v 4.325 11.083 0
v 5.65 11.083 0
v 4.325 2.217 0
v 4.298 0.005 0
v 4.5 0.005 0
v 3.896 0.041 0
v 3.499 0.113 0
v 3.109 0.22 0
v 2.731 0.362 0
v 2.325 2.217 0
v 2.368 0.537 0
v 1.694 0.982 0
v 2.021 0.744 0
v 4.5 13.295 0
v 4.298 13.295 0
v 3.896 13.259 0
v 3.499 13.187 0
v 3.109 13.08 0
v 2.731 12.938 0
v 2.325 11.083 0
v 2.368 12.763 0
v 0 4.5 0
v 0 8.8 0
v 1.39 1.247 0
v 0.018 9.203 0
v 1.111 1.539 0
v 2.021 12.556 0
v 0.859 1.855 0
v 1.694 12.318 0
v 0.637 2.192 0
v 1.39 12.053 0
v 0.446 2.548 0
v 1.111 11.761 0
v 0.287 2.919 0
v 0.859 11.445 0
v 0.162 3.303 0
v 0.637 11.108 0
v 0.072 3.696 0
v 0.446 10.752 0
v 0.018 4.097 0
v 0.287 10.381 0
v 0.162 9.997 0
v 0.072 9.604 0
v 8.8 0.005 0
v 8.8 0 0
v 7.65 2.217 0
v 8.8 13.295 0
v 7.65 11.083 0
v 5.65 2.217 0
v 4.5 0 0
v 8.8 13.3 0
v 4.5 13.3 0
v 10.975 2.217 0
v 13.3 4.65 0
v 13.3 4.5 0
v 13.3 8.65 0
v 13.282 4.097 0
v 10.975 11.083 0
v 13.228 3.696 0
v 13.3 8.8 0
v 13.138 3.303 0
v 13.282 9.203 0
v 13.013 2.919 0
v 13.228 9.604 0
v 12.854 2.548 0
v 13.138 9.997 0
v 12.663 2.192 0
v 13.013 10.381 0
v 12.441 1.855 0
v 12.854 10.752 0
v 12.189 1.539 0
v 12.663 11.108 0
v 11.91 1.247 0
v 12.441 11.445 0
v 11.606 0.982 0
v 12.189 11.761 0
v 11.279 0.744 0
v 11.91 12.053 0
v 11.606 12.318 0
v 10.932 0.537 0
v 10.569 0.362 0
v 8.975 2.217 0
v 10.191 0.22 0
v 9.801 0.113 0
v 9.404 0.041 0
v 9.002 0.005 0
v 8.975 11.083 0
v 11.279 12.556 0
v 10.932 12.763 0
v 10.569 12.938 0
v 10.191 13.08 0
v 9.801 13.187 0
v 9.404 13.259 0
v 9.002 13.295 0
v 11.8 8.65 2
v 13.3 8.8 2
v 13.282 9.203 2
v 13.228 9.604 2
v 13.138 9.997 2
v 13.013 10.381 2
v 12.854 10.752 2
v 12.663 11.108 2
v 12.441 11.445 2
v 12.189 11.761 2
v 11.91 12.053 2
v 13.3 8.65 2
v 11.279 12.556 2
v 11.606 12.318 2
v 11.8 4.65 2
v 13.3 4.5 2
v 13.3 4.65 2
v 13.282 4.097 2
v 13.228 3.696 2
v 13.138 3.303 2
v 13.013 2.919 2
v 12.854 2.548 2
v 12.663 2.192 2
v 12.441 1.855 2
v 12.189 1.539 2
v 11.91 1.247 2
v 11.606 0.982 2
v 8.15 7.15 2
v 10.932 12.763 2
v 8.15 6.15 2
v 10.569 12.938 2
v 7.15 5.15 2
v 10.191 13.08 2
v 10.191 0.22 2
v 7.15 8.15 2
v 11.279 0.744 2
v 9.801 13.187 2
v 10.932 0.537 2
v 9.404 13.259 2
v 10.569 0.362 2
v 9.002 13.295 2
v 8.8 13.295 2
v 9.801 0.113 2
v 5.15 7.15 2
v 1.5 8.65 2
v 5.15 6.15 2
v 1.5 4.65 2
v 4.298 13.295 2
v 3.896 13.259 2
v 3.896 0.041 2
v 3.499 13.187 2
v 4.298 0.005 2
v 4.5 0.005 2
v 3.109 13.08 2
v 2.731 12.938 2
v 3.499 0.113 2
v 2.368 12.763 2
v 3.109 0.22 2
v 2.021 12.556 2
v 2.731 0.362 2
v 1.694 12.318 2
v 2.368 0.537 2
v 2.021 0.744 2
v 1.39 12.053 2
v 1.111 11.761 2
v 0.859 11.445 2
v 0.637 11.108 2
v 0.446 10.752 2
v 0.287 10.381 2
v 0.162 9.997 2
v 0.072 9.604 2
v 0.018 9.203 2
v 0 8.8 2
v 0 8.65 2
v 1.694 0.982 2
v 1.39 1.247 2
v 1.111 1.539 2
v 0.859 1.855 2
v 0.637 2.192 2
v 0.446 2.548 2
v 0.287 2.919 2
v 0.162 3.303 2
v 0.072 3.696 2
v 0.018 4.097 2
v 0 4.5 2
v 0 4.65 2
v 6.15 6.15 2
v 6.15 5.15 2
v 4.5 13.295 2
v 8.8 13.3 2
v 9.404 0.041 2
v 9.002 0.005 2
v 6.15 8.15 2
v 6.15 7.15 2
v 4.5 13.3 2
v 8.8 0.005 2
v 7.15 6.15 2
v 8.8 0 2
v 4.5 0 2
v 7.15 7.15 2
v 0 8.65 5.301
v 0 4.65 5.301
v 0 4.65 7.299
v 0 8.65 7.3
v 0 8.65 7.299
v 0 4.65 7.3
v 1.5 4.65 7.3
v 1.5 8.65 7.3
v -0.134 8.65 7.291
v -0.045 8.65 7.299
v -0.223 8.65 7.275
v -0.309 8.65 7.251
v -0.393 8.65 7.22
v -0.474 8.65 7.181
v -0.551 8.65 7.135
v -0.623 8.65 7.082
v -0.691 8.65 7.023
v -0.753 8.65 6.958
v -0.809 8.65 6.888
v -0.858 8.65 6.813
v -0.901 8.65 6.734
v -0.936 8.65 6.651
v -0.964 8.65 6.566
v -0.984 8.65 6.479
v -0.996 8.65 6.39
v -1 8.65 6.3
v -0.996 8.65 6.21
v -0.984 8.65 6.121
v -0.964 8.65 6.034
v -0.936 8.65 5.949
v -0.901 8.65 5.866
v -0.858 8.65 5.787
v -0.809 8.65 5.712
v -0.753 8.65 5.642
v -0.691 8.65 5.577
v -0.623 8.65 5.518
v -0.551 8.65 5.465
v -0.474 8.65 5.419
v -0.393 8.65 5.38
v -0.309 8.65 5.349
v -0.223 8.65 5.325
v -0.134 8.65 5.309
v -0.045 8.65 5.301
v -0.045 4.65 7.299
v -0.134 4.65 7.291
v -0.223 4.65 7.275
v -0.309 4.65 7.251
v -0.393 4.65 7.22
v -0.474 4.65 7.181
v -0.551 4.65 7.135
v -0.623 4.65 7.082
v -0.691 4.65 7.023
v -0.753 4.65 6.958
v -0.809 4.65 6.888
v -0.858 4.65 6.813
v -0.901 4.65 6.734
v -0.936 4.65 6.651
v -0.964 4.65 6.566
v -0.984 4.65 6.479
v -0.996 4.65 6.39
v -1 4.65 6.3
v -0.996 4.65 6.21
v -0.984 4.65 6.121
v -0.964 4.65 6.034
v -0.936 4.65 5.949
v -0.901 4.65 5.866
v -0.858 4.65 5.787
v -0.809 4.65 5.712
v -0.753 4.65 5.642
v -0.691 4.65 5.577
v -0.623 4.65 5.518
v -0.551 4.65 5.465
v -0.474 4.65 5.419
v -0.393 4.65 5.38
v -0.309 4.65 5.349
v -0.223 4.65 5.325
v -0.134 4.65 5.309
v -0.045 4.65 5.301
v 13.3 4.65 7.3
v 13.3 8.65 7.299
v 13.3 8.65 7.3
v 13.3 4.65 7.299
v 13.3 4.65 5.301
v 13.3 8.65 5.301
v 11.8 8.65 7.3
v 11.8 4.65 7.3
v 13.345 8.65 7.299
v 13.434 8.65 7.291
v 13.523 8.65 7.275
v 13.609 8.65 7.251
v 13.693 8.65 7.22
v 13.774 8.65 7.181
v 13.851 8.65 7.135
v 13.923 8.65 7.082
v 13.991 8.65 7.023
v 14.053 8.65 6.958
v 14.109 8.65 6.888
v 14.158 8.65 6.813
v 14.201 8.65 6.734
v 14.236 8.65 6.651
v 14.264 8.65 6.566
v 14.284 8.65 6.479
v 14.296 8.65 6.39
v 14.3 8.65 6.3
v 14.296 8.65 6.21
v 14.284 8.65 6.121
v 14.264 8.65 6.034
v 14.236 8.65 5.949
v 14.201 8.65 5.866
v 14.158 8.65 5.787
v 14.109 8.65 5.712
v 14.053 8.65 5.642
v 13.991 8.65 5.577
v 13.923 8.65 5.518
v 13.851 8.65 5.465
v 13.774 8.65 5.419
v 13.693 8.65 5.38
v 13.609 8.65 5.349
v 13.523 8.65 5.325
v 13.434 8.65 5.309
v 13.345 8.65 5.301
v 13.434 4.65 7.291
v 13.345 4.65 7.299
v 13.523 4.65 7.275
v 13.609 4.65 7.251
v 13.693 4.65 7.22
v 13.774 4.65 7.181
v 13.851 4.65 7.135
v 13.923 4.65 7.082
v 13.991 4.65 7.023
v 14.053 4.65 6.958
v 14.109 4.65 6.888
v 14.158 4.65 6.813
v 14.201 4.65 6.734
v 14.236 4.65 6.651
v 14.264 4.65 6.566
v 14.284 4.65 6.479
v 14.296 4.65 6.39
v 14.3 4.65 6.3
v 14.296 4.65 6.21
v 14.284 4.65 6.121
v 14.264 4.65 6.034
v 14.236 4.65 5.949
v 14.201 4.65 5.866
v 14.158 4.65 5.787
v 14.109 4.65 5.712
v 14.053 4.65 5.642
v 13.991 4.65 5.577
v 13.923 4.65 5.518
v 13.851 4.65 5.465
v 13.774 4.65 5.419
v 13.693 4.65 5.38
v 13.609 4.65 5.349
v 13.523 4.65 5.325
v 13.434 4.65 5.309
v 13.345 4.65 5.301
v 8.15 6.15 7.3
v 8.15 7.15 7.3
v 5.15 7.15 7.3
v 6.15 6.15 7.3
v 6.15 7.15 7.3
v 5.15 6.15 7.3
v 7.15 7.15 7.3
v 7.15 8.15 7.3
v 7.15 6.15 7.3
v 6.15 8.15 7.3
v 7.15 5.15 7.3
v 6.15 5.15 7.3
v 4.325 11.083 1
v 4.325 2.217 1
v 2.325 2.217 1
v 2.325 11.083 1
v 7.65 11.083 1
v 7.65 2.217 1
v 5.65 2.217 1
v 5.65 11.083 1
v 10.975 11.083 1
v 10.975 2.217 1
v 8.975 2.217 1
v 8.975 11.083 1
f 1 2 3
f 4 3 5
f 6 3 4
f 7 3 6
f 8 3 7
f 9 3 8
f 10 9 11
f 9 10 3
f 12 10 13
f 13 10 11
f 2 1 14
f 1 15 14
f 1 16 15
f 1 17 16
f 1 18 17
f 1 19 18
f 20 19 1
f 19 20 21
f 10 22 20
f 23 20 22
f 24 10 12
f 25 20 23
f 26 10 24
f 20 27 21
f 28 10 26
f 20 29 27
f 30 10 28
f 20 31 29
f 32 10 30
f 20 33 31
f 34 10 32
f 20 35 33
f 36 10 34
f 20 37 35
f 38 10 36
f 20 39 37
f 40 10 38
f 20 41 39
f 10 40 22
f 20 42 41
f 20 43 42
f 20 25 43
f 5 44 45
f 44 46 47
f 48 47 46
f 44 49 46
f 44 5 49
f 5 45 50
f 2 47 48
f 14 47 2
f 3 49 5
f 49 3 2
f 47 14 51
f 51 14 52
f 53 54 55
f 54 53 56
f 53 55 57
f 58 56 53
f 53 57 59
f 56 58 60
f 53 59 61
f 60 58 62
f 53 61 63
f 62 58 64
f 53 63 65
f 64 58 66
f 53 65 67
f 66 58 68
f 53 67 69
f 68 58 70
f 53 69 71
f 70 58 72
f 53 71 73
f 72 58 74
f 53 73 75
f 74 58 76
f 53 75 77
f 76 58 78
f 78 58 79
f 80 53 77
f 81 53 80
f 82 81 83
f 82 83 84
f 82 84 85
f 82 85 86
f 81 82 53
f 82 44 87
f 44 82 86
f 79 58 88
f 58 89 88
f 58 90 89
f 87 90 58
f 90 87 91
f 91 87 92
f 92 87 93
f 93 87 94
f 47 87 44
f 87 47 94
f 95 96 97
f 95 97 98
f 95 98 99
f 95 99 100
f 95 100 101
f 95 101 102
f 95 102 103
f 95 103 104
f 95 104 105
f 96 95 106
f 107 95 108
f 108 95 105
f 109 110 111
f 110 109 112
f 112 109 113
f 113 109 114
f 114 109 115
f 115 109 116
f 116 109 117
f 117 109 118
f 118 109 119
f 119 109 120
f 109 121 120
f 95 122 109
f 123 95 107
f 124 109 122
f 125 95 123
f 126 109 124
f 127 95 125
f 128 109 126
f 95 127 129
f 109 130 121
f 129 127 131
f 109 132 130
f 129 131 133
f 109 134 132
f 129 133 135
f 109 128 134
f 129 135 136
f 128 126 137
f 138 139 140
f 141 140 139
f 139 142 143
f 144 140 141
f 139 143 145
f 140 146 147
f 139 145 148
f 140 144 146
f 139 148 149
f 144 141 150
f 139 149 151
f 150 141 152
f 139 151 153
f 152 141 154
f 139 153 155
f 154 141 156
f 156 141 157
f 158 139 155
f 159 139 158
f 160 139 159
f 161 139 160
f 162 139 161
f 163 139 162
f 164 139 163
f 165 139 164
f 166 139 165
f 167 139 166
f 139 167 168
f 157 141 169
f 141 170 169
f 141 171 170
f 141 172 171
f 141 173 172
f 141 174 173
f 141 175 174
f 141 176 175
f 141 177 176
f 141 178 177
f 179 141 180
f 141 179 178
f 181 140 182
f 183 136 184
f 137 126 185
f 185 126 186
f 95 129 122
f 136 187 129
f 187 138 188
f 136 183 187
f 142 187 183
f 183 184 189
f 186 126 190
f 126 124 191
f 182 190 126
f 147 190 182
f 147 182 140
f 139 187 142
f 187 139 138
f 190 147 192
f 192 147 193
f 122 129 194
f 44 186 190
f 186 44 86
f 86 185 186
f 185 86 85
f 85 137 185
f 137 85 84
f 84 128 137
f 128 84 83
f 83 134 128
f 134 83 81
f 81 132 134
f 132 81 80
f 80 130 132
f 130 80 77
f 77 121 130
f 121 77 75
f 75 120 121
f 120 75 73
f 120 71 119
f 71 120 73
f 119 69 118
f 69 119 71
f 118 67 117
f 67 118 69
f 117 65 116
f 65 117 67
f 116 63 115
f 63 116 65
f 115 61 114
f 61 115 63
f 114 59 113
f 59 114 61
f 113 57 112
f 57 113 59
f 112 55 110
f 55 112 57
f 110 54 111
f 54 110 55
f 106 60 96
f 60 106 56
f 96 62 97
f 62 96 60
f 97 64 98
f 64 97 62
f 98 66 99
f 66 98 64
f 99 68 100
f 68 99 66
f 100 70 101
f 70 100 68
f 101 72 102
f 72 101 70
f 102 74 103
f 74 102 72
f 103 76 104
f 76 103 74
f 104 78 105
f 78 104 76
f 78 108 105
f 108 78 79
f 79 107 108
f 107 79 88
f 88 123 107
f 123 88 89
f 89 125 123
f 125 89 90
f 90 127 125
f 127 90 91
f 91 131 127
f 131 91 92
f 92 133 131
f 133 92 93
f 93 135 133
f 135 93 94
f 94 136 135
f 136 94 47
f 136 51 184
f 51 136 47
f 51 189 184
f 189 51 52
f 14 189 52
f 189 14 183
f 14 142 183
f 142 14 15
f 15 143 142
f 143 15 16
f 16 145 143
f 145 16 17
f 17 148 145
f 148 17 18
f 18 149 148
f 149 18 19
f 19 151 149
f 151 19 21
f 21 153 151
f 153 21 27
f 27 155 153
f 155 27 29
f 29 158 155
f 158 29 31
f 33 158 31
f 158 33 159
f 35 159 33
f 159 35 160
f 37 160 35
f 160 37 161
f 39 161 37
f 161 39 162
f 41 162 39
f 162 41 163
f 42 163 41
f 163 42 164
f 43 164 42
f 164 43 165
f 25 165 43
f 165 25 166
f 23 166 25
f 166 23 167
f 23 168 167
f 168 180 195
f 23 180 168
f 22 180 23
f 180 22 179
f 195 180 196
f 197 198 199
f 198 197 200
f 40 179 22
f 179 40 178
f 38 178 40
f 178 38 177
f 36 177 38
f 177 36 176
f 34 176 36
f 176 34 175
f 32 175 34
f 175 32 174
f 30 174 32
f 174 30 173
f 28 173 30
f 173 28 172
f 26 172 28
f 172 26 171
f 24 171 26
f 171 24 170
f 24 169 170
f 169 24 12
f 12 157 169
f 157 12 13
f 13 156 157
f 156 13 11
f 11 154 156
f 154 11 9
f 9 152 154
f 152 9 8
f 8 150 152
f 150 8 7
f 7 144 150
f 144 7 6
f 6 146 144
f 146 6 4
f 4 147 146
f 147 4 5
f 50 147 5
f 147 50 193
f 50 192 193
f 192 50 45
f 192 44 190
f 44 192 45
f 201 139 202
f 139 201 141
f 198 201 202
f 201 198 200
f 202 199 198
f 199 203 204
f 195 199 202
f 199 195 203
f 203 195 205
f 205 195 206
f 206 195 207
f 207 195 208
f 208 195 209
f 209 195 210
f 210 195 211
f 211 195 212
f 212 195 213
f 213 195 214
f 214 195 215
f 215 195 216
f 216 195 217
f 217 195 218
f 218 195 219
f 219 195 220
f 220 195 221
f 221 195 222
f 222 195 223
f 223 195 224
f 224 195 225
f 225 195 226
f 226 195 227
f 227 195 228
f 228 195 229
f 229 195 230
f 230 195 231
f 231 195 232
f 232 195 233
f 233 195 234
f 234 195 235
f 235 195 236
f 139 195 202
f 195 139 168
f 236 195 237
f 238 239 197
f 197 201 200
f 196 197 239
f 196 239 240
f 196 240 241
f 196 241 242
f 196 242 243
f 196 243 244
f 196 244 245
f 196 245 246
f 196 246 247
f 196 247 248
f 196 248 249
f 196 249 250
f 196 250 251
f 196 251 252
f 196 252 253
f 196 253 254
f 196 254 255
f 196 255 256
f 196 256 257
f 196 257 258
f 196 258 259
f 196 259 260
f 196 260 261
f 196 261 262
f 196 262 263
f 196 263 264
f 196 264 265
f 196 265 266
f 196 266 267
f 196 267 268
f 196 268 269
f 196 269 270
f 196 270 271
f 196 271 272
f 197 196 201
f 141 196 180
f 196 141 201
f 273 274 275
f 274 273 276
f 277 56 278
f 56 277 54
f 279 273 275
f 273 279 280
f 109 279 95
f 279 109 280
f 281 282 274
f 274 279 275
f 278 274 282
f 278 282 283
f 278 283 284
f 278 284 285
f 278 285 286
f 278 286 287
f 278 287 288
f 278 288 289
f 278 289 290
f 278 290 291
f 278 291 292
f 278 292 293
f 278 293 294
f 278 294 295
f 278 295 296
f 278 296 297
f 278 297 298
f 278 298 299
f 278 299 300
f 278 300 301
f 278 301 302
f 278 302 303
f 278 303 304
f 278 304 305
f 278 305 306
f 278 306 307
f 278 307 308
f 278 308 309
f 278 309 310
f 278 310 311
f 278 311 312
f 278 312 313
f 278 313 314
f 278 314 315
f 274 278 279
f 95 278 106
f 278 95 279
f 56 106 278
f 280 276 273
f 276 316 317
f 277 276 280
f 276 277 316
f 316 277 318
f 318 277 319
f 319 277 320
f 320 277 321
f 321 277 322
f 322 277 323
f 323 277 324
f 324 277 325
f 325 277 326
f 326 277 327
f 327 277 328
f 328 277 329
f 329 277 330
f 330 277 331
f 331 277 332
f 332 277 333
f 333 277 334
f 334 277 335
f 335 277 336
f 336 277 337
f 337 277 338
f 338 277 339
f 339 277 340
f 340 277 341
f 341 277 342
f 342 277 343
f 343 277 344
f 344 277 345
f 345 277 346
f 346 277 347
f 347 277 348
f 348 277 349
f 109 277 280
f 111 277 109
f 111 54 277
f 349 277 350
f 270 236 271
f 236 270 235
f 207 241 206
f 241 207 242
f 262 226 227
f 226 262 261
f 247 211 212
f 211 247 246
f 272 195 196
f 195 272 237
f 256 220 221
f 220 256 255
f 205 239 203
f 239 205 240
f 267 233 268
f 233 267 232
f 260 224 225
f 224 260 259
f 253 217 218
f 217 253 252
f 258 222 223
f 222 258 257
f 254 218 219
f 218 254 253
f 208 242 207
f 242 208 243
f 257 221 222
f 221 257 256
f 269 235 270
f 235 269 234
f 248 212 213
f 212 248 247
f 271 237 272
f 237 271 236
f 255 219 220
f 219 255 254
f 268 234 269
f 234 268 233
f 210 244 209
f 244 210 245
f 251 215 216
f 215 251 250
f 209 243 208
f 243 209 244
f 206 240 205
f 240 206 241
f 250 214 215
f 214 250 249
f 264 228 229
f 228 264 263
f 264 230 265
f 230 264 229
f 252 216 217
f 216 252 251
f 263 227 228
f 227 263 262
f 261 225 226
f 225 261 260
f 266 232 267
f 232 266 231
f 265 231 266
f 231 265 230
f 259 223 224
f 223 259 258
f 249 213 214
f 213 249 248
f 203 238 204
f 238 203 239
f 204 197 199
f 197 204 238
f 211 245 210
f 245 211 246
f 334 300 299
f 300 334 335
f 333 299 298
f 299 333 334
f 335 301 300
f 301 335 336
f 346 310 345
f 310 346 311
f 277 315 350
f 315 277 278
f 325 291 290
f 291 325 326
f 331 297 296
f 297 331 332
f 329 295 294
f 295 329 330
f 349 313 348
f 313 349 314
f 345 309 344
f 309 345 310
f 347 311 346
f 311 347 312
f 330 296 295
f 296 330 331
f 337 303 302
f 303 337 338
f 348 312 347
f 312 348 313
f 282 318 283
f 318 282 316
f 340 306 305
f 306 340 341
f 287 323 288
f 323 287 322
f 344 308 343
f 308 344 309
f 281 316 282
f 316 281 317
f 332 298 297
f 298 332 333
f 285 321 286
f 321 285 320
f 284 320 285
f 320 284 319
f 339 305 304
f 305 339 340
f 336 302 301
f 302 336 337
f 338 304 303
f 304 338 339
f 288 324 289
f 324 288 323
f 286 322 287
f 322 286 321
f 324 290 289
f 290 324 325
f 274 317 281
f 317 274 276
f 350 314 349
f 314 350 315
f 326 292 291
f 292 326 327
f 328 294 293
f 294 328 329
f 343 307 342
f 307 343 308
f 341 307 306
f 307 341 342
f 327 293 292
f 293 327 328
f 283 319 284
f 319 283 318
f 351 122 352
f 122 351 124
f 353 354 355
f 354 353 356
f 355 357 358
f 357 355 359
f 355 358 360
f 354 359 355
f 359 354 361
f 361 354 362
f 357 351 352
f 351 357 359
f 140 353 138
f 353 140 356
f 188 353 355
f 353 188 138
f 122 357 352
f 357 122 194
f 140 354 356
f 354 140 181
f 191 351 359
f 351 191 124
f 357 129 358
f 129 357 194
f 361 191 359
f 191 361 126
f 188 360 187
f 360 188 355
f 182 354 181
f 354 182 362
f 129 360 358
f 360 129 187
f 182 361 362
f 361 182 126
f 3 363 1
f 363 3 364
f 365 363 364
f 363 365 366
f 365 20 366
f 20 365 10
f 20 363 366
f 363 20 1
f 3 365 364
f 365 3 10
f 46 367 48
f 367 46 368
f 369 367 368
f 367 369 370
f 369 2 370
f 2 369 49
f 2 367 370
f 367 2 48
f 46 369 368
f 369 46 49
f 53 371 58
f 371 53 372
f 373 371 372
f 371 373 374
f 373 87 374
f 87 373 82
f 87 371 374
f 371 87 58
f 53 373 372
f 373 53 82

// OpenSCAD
// Gombik z Holiaceho Strojceka
// 20260707, Ondrej DURAS (dury) NOKIA

/* [Config] */
preview="basic"; // [basic,plate]
$fn=70;  // [10:10:100]
spi=0.1; // odstup kolika
spo=0.1; // odstup diery
spp=5.0; // odstup medzi suciastkami na vyrobnej doske
nox=4;   // pocet gombikov v smere X
noy=5;   // pocet gombikov v smere Y

// hrana stvorca
butWidth=13.3;
// vyska kolickov
butHight=7.3;  
// zaoblenie hran stvorca
butRound=4.5;  
// hrana stredoveho kriza
butCross=3.0;
// hrubka hrany stredoveho kriza
butCrosI=1.0;
// hrubka materialu tlacitka
butTickB=2.0;
// hrubka postrannych istiacich kolickov smerom do vnutra stvorca
butTickI=1.5;
// polomer valceka zachytu na istiacich kolickoch, musi byt mesi ako butTickI
butTickX=1.0;
// hrubka postrannych kolickov po hrane tlacitka
butTickH=4.0;
colorButtonX="#b0b050"; // farba materialu gombika
colorButtonY="#50b0b0"; // farba materialu gombika


module hcButton(bw=butWidth,bh=butHight,br=butRound,bcs=butCross,bci=butCrosI,btb=butTickB,bti=butTickI,btx=butTickX,bth=butTickH) {
    b1=bw-br;
    r1=br+1;
    difference() {
    color(colorButtonX) 
    union() {
        linear_extrude(butTickB) {
        union() {
        difference() {
            square(bw);
            translate([-1,-1]) square(r1); // lavy predny vyrez pre zaoblenie
            translate([b1,-1]) square(r1); // pravy predny
            translate([-1,b1]) square(r1); // lavy zadny
            translate([b1,b1]) square(r1); // pravy zadny
        } // diff
            translate([br,br]) circle(r=br); // lave predne zaoblenie
            translate([b1,br]) circle(r=br); // prave predne
            translate([br,b1]) circle(r=br); // lave zadne
            translate([b1,b1]) circle(r=br); // prave zadne
       
 
        } // union
        } // extr
        translate([0,bw/2-bth/2,0])      cube([bti,bth,bh]);  // lava palicka
        translate([bw-bti,bw/2-bth/2,0]) cube([bti,bth,bh]);  // prava palicka
        translate([0,bw/2-bth/2,bh-btx]) rotate([-90,0,0]) cylinder(h=bth,r=btx);  // zachyt na lavej palicke      
        translate([bw,bw/2-bth/2,bh-btx]) rotate([-90,0,0]) cylinder(h=bth,r=btx); // zachyt na pravej palicke

        translate([bw/2-bcs/2,bw/2-bci/2,0]) cube([bcs,bci,bh]);
        translate([bw/2-bci/2,bw/2-bcs/2,0]) cube([bci,bcs,bh]);
    }  // uniV
        for(i=[1:1:3]) {
          color(colorButtonY)  translate([bw/4*i-btb/2,bw/6,-0.001]) cube([btb,bw/3*2,btb/2+0.001]);
        }
    } // diffV
}     

module preview(preview=preview) {
    if(preview=="basic") { hcButton(); }
    if(preview=="plate") {
        for(y=[0:1:noy-1]) for(x=[0:1:nox-1]) { 
            translate([x*(butWidth+spp),y*(butWidth+spp),0]) hcButton(); 
        }
    }
}

/* [Preview] */
preview();

// --- end ---
      
